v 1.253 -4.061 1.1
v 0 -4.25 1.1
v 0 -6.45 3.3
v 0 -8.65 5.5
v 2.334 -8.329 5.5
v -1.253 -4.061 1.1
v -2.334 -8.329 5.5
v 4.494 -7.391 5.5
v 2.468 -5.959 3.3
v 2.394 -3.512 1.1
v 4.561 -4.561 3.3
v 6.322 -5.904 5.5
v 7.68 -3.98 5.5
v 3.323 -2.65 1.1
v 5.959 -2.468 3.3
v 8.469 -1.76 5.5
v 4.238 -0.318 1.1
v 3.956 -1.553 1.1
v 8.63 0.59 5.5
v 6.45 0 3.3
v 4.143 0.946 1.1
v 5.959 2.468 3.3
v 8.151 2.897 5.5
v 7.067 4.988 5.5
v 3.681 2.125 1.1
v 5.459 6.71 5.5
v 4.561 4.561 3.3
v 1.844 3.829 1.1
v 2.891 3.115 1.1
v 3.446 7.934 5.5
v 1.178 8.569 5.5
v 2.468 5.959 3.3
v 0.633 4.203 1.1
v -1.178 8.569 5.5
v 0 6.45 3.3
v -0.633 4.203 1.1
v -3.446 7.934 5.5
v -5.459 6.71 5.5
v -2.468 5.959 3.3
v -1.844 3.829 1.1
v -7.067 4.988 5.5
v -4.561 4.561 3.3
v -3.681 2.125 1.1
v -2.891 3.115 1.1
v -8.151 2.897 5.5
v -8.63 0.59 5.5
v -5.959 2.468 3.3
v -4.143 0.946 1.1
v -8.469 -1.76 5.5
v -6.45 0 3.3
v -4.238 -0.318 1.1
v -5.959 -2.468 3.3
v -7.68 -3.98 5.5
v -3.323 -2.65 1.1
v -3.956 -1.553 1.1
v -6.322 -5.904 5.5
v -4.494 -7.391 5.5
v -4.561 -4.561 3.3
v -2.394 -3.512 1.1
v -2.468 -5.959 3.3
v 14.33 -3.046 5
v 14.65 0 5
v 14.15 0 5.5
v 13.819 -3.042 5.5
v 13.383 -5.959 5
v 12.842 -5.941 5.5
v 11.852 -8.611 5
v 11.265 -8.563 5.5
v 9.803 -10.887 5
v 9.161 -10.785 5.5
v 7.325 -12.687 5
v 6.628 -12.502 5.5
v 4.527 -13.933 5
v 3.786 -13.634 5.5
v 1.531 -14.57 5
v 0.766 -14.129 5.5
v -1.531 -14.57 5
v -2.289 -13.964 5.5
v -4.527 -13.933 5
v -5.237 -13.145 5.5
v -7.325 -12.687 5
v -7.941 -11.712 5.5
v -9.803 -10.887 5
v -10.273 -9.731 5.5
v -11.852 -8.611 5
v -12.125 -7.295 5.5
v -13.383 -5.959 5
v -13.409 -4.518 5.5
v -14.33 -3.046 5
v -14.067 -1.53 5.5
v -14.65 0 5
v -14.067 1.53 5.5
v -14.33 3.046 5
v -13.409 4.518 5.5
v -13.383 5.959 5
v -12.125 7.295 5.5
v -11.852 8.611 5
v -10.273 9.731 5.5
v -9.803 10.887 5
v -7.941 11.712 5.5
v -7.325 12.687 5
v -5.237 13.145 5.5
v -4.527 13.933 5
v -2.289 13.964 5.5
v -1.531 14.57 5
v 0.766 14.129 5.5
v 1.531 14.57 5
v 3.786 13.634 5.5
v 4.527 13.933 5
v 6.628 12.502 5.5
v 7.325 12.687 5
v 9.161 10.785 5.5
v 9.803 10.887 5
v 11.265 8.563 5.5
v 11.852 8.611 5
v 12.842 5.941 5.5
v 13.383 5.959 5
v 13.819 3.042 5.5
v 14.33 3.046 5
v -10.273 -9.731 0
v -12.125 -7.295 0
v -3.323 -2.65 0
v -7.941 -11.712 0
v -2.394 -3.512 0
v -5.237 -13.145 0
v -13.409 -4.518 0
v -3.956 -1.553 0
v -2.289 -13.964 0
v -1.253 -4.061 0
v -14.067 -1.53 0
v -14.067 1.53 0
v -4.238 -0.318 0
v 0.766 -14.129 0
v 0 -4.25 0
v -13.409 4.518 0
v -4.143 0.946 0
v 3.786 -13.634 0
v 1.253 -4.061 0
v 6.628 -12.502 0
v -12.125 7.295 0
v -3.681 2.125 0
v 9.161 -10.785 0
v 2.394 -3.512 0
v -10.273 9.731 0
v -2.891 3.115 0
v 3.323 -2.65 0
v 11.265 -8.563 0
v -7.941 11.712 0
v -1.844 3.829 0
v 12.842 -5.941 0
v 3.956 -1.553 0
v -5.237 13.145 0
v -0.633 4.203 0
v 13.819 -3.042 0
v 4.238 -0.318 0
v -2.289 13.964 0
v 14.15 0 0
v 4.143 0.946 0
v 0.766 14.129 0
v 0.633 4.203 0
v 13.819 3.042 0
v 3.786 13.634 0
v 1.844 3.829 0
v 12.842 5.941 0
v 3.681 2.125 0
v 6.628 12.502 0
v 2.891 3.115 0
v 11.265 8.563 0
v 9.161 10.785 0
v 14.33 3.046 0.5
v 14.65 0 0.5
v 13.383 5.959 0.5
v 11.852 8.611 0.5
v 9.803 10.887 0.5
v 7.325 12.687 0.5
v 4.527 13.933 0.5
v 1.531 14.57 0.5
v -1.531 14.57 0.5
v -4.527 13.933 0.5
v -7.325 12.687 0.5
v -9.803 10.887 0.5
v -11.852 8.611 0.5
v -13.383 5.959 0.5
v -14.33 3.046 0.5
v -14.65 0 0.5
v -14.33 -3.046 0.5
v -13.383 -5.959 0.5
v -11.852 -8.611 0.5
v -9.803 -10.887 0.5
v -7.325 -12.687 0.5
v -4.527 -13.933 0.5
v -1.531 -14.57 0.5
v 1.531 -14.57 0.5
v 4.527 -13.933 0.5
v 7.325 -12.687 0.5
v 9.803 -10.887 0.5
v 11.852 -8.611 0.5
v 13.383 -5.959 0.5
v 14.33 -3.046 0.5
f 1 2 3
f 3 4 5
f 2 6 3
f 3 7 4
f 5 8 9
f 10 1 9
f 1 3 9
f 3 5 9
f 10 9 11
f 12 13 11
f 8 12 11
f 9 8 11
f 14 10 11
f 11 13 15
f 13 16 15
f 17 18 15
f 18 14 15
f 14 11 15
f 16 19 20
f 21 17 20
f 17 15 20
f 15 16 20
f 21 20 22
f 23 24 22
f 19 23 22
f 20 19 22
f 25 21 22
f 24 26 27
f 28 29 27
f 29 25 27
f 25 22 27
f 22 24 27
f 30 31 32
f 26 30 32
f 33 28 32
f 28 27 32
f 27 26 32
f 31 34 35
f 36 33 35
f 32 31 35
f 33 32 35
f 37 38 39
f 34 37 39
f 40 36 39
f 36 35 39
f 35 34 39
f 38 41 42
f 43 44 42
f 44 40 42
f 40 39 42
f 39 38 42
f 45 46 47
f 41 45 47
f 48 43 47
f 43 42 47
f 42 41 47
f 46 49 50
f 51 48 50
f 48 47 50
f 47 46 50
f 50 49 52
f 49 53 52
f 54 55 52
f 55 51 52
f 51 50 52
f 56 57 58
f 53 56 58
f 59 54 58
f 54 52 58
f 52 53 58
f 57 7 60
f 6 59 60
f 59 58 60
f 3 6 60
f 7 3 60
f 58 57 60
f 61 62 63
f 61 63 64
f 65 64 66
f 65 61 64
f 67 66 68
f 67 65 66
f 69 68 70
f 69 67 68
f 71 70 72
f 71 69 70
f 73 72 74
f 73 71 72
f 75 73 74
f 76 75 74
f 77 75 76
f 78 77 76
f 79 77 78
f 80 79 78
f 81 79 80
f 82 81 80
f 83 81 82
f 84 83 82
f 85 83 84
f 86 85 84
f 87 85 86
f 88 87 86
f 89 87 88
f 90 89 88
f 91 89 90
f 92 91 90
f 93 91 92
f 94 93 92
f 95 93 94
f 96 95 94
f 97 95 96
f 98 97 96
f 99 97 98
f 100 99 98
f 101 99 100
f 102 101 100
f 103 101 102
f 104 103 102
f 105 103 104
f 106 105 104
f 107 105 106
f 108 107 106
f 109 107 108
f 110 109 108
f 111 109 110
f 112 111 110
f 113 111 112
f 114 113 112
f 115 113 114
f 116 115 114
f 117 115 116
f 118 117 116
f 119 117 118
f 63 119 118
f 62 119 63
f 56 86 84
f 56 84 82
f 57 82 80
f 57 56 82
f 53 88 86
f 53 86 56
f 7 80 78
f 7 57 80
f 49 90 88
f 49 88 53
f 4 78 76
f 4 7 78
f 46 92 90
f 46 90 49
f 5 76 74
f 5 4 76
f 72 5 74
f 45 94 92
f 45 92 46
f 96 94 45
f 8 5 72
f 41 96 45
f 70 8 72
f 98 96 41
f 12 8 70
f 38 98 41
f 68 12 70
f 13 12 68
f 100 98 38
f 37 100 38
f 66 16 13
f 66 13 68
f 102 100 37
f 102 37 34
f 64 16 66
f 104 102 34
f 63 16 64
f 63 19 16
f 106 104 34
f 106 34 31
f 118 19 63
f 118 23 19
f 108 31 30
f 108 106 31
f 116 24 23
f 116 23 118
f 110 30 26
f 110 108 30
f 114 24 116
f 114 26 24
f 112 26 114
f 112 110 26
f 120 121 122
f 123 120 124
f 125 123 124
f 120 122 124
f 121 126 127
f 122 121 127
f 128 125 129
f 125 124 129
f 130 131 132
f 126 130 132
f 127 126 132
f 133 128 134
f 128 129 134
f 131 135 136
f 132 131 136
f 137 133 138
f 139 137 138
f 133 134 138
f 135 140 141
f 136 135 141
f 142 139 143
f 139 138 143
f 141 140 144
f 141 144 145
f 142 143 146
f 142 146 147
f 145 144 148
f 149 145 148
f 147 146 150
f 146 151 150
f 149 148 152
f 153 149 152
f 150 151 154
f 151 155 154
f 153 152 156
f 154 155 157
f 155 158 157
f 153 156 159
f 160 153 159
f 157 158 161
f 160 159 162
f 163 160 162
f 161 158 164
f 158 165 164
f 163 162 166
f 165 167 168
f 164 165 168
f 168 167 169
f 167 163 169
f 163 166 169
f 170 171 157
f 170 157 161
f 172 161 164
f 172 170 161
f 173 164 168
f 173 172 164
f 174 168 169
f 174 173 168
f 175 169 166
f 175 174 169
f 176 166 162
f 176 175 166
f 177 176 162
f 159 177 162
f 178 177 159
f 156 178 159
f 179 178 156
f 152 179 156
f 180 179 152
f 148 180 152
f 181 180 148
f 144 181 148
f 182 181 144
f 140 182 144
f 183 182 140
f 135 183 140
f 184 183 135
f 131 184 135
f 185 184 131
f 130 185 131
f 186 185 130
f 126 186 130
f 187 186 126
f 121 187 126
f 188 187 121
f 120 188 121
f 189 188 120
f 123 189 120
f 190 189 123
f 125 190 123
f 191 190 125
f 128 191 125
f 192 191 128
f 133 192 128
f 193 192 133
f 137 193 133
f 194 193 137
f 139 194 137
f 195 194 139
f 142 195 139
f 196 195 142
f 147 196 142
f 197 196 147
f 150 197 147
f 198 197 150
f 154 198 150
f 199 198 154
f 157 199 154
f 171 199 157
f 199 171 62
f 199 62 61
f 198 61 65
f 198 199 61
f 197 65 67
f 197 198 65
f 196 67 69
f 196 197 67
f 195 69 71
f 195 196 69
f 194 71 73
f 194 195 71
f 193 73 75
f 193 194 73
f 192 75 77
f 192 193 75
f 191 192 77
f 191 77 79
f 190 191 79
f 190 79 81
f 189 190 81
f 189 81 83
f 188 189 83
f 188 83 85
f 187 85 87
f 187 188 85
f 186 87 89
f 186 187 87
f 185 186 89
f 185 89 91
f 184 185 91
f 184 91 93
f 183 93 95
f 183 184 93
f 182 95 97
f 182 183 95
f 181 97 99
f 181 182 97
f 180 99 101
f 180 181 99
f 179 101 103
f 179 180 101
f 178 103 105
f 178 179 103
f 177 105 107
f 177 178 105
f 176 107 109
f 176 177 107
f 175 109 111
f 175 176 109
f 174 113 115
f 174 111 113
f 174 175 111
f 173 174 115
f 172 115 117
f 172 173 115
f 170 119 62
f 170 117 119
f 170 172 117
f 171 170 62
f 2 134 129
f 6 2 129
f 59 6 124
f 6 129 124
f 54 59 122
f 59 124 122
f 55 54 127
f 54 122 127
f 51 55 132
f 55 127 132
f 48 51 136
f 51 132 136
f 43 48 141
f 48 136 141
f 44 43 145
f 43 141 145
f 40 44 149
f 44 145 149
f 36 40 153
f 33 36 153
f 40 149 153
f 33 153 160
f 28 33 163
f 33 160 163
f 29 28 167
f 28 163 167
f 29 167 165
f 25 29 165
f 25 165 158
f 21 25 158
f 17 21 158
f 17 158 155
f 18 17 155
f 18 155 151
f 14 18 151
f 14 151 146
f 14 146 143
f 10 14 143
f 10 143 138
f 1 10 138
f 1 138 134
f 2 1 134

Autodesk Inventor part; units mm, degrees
ref_plane "YZ Plane" through (0, 0, 0) normal (1, 0, 0) x (0, 1, 0)
ref_plane "XZ Plane" through (0, 0, 0) normal (0, 1, 0) x (-1, 0, 0)
ref_plane "XY Plane" through (0, 0, 0) normal (0, 0, 1) x (1, 0, 0)
sketch "Sketch1" plane through (0, 0, 0) normal (0, 0, 1) x (1, 0, 0)
  circle A0 centre (0, 0) radius 14.65
  dimension "d0" = 29.3
extrude "Extrusion1" add sketch "Sketch1" along normal blind 5.5
chamfer "Chamfer1" distance 0.5 angle 45 2 edges at (-14.65, 0, 5.5) (-14.65, 0, 0)
sketch "Sketch2" plane through (0, 0, 5.5) normal (0, 0, 1) x (1, 0, 0)
  circle A0 centre (0, 0) radius 14.65 projected
hole "Hole1" at (0, 0, 5.5) direction (0, 0, -1) diameter 8.5 depth 8 tip angle 118 countersink diameter 17.3 countersink angle 90
properties part number "ring wiel" material "Stainless Steel"
